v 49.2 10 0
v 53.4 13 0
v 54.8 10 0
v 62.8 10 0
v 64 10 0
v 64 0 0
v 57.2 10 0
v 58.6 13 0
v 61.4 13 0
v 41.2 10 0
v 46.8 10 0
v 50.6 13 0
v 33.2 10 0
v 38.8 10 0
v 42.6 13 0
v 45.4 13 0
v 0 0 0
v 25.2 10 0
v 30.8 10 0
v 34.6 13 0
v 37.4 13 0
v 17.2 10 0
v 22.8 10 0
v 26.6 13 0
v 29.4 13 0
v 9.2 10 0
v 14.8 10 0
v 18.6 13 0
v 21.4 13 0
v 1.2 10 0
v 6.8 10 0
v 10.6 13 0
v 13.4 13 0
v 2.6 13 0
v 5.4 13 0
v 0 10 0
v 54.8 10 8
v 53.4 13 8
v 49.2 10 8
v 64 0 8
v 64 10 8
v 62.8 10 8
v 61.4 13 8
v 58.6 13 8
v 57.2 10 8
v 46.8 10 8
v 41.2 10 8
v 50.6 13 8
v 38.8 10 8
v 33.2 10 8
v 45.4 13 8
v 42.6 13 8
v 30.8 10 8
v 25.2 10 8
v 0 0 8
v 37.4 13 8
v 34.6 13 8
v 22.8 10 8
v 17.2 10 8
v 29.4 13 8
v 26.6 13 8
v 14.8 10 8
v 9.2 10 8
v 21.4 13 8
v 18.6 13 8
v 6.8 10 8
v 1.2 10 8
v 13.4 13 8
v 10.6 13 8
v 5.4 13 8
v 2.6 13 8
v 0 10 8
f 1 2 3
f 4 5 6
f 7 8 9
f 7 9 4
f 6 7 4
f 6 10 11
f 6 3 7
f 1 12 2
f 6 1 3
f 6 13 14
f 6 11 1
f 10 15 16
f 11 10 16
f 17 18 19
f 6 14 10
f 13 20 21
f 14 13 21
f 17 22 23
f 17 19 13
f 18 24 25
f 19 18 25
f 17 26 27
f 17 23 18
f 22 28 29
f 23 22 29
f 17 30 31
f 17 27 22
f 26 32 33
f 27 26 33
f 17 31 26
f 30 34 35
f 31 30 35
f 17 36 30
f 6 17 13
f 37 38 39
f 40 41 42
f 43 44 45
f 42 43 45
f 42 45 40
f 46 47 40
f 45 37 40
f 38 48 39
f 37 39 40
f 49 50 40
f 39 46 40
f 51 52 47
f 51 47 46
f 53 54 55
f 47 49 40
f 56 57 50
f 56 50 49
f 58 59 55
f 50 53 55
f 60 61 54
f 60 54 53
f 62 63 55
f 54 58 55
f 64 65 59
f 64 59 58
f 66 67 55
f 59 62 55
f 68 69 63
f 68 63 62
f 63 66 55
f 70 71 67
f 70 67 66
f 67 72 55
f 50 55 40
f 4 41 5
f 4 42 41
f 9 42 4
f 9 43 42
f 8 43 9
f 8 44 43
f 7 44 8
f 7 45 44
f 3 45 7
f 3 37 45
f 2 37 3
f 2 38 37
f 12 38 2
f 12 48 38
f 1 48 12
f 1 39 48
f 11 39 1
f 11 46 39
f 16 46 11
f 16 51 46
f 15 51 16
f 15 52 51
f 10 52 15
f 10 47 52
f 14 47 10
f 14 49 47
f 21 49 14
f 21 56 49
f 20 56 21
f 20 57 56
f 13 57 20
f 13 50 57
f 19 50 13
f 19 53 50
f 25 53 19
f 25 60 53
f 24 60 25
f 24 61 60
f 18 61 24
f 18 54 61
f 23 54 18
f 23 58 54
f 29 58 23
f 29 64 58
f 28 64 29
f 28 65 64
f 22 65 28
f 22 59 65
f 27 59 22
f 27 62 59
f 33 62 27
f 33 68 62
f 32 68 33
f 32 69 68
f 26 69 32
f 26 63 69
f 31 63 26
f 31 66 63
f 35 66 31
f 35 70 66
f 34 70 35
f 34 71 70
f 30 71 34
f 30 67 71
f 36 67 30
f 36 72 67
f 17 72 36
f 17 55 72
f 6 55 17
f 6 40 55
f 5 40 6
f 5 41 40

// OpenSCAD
$fn = 32;

// ----------------------------------------------------------------------
// Gear rack: 8 teeth, pitch 8 mm
// ----------------------------------------------------------------------

// --- parameters (mm) ---
teeth = 8;                // number of teeth
pitch = 8;                // tooth pitch, X
root_w = 5.6;             // tooth width at the root
tip_w = 2.8;              // tooth width at the tip
base_h = 10;              // rack body height, Y
tooth_h = 3;              // tooth height above the body
plate_t = 8;              // rack width, Z (extrusion height)

rack_l = teeth * pitch;  // overall length
total_h = base_h + tooth_h;  // overall height

profile = [[0, 0], [64, 0], [64, 10], [62.8, 10], [61.4, 13], [58.6, 13], [57.2, 10], [54.8, 10], [53.4, 13], [50.6, 13], [49.2, 10], [46.8, 10], [45.4, 13], [42.6, 13], [41.2, 10], [38.8, 10], [37.4, 13], [34.6, 13], [33.2, 10], [30.8, 10], [29.4, 13], [26.6, 13], [25.2, 10], [22.8, 10], [21.4, 13], [18.6, 13], [17.2, 10], [14.8, 10], [13.4, 13], [10.6, 13], [9.2, 10], [6.8, 10], [5.4, 13], [2.6, 13], [1.2, 10], [0, 10]];  // primary outline, 36 points, counter clockwise

// --- the one profile operation ---
linear_extrude(height = plate_t) polygon(points = profile);
